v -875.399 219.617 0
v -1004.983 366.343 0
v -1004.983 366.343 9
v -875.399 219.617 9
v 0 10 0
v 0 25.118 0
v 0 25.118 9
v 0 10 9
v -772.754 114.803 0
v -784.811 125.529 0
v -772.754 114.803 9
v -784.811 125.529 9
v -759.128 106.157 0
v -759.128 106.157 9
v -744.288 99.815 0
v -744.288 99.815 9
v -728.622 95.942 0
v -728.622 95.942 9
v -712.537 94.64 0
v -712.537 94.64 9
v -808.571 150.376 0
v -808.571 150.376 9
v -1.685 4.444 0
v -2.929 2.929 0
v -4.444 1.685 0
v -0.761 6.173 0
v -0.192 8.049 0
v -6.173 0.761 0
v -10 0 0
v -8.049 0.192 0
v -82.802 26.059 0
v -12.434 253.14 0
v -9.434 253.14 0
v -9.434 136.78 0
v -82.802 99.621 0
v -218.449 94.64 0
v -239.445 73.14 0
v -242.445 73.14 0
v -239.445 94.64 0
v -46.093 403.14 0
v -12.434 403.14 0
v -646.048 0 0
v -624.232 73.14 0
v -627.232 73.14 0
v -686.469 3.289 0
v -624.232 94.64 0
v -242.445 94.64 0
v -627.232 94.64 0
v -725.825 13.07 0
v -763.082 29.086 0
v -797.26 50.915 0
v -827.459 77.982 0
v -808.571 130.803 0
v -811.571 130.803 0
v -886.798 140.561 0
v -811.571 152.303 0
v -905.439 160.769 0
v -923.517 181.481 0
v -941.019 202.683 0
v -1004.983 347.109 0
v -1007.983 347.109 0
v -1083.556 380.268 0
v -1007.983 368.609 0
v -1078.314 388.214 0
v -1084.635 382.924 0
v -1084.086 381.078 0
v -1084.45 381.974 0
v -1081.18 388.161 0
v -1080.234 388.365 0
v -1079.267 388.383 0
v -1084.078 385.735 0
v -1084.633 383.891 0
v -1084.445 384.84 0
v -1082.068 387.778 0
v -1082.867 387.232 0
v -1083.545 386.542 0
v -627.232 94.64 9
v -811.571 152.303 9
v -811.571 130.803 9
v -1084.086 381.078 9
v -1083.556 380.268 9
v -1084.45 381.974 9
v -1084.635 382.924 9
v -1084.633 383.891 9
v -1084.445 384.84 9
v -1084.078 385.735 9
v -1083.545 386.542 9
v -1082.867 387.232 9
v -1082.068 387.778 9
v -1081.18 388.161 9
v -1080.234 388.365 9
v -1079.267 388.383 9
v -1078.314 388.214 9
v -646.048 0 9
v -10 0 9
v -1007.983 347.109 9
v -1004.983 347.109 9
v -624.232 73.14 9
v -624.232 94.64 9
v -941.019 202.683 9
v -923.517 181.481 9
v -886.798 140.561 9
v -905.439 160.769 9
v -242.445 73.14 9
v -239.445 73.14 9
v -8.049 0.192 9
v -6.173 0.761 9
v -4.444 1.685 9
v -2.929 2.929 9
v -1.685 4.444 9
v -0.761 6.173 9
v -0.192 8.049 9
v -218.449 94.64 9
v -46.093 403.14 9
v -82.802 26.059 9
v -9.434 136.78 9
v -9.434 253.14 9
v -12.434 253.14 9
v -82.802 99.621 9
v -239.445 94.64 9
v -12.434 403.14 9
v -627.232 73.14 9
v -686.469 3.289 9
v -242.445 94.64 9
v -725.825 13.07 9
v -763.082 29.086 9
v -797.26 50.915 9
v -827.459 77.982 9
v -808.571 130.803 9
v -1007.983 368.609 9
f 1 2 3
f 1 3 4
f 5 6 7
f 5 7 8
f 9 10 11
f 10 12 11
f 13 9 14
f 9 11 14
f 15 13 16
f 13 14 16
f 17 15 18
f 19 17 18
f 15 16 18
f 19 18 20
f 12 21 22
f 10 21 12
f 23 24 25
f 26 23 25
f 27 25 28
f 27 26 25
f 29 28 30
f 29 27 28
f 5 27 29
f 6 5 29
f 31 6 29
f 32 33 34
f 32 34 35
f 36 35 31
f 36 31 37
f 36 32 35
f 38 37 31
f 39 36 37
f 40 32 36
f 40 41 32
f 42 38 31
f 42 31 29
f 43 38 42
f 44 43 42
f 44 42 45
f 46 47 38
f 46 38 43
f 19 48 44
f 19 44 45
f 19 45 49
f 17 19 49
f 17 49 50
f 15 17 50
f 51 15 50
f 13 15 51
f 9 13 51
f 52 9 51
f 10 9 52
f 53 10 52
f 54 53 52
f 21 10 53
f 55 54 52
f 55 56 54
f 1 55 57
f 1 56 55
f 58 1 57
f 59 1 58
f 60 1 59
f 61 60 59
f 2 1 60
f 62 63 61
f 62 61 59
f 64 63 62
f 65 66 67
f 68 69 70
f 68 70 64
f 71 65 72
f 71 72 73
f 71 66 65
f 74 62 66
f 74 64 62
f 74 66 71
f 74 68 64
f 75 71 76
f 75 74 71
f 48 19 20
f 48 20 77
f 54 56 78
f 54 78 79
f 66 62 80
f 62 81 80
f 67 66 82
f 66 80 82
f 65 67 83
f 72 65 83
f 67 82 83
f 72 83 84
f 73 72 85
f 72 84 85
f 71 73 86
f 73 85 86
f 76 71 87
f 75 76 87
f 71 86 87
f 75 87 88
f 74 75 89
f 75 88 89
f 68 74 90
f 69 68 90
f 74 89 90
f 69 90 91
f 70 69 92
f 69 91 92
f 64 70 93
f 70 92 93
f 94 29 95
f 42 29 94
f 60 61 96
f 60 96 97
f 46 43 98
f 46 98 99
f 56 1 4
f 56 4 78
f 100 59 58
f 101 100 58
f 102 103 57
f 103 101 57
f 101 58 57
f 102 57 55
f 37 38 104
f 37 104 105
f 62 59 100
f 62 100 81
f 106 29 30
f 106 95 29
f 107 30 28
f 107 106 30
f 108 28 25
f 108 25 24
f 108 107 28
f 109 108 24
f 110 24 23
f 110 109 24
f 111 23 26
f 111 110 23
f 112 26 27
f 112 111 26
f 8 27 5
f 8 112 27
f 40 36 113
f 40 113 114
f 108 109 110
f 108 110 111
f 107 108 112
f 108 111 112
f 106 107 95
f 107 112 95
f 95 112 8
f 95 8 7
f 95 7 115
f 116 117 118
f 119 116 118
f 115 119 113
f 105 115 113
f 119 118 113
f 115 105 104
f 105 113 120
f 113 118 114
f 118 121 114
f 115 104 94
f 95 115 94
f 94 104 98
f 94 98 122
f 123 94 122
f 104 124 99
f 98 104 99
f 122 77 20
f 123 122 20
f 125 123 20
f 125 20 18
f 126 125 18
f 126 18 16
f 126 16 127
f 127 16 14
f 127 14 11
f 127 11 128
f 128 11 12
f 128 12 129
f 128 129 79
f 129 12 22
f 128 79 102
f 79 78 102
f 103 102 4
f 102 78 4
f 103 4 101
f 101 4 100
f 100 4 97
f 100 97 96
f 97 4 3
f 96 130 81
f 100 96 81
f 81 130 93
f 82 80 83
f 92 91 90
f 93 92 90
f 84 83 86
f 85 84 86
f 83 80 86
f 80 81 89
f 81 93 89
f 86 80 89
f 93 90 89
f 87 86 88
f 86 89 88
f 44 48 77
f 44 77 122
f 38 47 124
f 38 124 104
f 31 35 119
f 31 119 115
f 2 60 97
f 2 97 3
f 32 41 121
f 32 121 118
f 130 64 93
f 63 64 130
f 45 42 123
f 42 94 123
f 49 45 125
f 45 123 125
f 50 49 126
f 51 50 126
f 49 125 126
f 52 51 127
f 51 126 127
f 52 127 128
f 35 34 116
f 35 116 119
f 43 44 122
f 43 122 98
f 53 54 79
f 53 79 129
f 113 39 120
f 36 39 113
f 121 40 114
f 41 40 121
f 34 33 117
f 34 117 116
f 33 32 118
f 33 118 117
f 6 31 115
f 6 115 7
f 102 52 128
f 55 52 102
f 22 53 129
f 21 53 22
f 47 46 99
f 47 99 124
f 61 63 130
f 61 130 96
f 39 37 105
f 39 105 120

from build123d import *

# Parameters (mm, degrees)
BOSS_EXTRU_1_DEPTH = 9
CONG_1_R           = 1000
CONG_2_R           = 250
CONG_4_R           = 10
CONG_5_R           = 5
CONG_6_R           = 100


with BuildPart() as part:
    # Esquisse2 → Boss.-Extru.1 (new body)
    with BuildSketch(Plane.XY):
        Polygon((0, 0), (-753.514541491, 0), (-915.190229508, 170.50346618), (-1093.283519558, 392.387219436), (-1007.982904338, 368.608976512), (-1007.982904338, 347.108976512), (-1004.982904338, 347.108976512), (-1004.982904338, 366.343498655), (-875.399006988, 219.616732713), (-811.570765603, 152.303356597), (-811.570765603, 130.803356597), (-808.570765603, 130.803356597), (-808.570765603, 150.375814407), (-755.274625166, 94.639899826), (-627.232048759, 94.639899826), (-627.232048759, 73.139899826), (-624.232048759, 73.139899826), (-624.232048759, 94.639899826), (-242.444799847, 94.639899826), (-242.444799847, 73.139899826), (-239.444799847, 73.139899826), (-239.444799847, 94.639899826), (-218.449092799, 94.639899826), (-46.093252688, 403.139899826), (-12.434439882, 403.139899826), (-12.434439882, 253.139899826), (-9.434439882, 253.139899826), (-9.434439882, 136.779854294), (-82.801847324, 99.620582608), (-82.801847324, 26.059273195), (0, 25.118109707), align=None)
    extrude(amount=BOSS_EXTRU_1_DEPTH)

    # Congé1
    # the kernel refuses this fillet: 1000 mm, written as the material it takes off along each edge
    with BuildSketch(Plane(origin=(-915.190229508, 170.50346618, -103.157271439), x_dir=(0.6880722367162745, -0.7256421963063223, 0), z_dir=(0, 0, 1))) as cong_1_piece_1:
        with BuildLine():
            CenterArc((CONG_1_R * 0.0412629085755, CONG_1_R), CONG_1_R, 265.274299796, 4.725700204)
            Line((-CONG_1_R * 0.0411226366703, CONG_1_R * 0.00339946722142), (0, 0))
            Line((0, 0), (CONG_1_R * 0.0412629085755, 0))
        make_face()
    extrude(amount=215.314542878, mode=Mode.SUBTRACT)

    # Congé2
    cong_2_edges = [part.edges().sort_by_distance(p)[0] for p in [
        (-753.514541491, 0, 4.5),
    ]]
    fillet(cong_2_edges, radius=CONG_2_R)

    # Congé4
    cong_4_edges = [part.edges().sort_by_distance(p)[0] for p in [
        (0, 0, 4.5),
    ]]
    fillet(cong_4_edges, radius=CONG_4_R)

    # Congé5
    cong_5_edges = [part.edges().sort_by_distance(p)[0] for p in [
        (-1093.283519558, 392.387219436, 4.5),
    ]]
    fillet(cong_5_edges, radius=CONG_5_R)

    # Congé6
    cong_6_edges = [part.edges().sort_by_distance(p)[0] for p in [
        (-755.274625166, 94.639899826, 4.5),
    ]]
    fillet(cong_6_edges, radius=CONG_6_R)


solid = part.part
